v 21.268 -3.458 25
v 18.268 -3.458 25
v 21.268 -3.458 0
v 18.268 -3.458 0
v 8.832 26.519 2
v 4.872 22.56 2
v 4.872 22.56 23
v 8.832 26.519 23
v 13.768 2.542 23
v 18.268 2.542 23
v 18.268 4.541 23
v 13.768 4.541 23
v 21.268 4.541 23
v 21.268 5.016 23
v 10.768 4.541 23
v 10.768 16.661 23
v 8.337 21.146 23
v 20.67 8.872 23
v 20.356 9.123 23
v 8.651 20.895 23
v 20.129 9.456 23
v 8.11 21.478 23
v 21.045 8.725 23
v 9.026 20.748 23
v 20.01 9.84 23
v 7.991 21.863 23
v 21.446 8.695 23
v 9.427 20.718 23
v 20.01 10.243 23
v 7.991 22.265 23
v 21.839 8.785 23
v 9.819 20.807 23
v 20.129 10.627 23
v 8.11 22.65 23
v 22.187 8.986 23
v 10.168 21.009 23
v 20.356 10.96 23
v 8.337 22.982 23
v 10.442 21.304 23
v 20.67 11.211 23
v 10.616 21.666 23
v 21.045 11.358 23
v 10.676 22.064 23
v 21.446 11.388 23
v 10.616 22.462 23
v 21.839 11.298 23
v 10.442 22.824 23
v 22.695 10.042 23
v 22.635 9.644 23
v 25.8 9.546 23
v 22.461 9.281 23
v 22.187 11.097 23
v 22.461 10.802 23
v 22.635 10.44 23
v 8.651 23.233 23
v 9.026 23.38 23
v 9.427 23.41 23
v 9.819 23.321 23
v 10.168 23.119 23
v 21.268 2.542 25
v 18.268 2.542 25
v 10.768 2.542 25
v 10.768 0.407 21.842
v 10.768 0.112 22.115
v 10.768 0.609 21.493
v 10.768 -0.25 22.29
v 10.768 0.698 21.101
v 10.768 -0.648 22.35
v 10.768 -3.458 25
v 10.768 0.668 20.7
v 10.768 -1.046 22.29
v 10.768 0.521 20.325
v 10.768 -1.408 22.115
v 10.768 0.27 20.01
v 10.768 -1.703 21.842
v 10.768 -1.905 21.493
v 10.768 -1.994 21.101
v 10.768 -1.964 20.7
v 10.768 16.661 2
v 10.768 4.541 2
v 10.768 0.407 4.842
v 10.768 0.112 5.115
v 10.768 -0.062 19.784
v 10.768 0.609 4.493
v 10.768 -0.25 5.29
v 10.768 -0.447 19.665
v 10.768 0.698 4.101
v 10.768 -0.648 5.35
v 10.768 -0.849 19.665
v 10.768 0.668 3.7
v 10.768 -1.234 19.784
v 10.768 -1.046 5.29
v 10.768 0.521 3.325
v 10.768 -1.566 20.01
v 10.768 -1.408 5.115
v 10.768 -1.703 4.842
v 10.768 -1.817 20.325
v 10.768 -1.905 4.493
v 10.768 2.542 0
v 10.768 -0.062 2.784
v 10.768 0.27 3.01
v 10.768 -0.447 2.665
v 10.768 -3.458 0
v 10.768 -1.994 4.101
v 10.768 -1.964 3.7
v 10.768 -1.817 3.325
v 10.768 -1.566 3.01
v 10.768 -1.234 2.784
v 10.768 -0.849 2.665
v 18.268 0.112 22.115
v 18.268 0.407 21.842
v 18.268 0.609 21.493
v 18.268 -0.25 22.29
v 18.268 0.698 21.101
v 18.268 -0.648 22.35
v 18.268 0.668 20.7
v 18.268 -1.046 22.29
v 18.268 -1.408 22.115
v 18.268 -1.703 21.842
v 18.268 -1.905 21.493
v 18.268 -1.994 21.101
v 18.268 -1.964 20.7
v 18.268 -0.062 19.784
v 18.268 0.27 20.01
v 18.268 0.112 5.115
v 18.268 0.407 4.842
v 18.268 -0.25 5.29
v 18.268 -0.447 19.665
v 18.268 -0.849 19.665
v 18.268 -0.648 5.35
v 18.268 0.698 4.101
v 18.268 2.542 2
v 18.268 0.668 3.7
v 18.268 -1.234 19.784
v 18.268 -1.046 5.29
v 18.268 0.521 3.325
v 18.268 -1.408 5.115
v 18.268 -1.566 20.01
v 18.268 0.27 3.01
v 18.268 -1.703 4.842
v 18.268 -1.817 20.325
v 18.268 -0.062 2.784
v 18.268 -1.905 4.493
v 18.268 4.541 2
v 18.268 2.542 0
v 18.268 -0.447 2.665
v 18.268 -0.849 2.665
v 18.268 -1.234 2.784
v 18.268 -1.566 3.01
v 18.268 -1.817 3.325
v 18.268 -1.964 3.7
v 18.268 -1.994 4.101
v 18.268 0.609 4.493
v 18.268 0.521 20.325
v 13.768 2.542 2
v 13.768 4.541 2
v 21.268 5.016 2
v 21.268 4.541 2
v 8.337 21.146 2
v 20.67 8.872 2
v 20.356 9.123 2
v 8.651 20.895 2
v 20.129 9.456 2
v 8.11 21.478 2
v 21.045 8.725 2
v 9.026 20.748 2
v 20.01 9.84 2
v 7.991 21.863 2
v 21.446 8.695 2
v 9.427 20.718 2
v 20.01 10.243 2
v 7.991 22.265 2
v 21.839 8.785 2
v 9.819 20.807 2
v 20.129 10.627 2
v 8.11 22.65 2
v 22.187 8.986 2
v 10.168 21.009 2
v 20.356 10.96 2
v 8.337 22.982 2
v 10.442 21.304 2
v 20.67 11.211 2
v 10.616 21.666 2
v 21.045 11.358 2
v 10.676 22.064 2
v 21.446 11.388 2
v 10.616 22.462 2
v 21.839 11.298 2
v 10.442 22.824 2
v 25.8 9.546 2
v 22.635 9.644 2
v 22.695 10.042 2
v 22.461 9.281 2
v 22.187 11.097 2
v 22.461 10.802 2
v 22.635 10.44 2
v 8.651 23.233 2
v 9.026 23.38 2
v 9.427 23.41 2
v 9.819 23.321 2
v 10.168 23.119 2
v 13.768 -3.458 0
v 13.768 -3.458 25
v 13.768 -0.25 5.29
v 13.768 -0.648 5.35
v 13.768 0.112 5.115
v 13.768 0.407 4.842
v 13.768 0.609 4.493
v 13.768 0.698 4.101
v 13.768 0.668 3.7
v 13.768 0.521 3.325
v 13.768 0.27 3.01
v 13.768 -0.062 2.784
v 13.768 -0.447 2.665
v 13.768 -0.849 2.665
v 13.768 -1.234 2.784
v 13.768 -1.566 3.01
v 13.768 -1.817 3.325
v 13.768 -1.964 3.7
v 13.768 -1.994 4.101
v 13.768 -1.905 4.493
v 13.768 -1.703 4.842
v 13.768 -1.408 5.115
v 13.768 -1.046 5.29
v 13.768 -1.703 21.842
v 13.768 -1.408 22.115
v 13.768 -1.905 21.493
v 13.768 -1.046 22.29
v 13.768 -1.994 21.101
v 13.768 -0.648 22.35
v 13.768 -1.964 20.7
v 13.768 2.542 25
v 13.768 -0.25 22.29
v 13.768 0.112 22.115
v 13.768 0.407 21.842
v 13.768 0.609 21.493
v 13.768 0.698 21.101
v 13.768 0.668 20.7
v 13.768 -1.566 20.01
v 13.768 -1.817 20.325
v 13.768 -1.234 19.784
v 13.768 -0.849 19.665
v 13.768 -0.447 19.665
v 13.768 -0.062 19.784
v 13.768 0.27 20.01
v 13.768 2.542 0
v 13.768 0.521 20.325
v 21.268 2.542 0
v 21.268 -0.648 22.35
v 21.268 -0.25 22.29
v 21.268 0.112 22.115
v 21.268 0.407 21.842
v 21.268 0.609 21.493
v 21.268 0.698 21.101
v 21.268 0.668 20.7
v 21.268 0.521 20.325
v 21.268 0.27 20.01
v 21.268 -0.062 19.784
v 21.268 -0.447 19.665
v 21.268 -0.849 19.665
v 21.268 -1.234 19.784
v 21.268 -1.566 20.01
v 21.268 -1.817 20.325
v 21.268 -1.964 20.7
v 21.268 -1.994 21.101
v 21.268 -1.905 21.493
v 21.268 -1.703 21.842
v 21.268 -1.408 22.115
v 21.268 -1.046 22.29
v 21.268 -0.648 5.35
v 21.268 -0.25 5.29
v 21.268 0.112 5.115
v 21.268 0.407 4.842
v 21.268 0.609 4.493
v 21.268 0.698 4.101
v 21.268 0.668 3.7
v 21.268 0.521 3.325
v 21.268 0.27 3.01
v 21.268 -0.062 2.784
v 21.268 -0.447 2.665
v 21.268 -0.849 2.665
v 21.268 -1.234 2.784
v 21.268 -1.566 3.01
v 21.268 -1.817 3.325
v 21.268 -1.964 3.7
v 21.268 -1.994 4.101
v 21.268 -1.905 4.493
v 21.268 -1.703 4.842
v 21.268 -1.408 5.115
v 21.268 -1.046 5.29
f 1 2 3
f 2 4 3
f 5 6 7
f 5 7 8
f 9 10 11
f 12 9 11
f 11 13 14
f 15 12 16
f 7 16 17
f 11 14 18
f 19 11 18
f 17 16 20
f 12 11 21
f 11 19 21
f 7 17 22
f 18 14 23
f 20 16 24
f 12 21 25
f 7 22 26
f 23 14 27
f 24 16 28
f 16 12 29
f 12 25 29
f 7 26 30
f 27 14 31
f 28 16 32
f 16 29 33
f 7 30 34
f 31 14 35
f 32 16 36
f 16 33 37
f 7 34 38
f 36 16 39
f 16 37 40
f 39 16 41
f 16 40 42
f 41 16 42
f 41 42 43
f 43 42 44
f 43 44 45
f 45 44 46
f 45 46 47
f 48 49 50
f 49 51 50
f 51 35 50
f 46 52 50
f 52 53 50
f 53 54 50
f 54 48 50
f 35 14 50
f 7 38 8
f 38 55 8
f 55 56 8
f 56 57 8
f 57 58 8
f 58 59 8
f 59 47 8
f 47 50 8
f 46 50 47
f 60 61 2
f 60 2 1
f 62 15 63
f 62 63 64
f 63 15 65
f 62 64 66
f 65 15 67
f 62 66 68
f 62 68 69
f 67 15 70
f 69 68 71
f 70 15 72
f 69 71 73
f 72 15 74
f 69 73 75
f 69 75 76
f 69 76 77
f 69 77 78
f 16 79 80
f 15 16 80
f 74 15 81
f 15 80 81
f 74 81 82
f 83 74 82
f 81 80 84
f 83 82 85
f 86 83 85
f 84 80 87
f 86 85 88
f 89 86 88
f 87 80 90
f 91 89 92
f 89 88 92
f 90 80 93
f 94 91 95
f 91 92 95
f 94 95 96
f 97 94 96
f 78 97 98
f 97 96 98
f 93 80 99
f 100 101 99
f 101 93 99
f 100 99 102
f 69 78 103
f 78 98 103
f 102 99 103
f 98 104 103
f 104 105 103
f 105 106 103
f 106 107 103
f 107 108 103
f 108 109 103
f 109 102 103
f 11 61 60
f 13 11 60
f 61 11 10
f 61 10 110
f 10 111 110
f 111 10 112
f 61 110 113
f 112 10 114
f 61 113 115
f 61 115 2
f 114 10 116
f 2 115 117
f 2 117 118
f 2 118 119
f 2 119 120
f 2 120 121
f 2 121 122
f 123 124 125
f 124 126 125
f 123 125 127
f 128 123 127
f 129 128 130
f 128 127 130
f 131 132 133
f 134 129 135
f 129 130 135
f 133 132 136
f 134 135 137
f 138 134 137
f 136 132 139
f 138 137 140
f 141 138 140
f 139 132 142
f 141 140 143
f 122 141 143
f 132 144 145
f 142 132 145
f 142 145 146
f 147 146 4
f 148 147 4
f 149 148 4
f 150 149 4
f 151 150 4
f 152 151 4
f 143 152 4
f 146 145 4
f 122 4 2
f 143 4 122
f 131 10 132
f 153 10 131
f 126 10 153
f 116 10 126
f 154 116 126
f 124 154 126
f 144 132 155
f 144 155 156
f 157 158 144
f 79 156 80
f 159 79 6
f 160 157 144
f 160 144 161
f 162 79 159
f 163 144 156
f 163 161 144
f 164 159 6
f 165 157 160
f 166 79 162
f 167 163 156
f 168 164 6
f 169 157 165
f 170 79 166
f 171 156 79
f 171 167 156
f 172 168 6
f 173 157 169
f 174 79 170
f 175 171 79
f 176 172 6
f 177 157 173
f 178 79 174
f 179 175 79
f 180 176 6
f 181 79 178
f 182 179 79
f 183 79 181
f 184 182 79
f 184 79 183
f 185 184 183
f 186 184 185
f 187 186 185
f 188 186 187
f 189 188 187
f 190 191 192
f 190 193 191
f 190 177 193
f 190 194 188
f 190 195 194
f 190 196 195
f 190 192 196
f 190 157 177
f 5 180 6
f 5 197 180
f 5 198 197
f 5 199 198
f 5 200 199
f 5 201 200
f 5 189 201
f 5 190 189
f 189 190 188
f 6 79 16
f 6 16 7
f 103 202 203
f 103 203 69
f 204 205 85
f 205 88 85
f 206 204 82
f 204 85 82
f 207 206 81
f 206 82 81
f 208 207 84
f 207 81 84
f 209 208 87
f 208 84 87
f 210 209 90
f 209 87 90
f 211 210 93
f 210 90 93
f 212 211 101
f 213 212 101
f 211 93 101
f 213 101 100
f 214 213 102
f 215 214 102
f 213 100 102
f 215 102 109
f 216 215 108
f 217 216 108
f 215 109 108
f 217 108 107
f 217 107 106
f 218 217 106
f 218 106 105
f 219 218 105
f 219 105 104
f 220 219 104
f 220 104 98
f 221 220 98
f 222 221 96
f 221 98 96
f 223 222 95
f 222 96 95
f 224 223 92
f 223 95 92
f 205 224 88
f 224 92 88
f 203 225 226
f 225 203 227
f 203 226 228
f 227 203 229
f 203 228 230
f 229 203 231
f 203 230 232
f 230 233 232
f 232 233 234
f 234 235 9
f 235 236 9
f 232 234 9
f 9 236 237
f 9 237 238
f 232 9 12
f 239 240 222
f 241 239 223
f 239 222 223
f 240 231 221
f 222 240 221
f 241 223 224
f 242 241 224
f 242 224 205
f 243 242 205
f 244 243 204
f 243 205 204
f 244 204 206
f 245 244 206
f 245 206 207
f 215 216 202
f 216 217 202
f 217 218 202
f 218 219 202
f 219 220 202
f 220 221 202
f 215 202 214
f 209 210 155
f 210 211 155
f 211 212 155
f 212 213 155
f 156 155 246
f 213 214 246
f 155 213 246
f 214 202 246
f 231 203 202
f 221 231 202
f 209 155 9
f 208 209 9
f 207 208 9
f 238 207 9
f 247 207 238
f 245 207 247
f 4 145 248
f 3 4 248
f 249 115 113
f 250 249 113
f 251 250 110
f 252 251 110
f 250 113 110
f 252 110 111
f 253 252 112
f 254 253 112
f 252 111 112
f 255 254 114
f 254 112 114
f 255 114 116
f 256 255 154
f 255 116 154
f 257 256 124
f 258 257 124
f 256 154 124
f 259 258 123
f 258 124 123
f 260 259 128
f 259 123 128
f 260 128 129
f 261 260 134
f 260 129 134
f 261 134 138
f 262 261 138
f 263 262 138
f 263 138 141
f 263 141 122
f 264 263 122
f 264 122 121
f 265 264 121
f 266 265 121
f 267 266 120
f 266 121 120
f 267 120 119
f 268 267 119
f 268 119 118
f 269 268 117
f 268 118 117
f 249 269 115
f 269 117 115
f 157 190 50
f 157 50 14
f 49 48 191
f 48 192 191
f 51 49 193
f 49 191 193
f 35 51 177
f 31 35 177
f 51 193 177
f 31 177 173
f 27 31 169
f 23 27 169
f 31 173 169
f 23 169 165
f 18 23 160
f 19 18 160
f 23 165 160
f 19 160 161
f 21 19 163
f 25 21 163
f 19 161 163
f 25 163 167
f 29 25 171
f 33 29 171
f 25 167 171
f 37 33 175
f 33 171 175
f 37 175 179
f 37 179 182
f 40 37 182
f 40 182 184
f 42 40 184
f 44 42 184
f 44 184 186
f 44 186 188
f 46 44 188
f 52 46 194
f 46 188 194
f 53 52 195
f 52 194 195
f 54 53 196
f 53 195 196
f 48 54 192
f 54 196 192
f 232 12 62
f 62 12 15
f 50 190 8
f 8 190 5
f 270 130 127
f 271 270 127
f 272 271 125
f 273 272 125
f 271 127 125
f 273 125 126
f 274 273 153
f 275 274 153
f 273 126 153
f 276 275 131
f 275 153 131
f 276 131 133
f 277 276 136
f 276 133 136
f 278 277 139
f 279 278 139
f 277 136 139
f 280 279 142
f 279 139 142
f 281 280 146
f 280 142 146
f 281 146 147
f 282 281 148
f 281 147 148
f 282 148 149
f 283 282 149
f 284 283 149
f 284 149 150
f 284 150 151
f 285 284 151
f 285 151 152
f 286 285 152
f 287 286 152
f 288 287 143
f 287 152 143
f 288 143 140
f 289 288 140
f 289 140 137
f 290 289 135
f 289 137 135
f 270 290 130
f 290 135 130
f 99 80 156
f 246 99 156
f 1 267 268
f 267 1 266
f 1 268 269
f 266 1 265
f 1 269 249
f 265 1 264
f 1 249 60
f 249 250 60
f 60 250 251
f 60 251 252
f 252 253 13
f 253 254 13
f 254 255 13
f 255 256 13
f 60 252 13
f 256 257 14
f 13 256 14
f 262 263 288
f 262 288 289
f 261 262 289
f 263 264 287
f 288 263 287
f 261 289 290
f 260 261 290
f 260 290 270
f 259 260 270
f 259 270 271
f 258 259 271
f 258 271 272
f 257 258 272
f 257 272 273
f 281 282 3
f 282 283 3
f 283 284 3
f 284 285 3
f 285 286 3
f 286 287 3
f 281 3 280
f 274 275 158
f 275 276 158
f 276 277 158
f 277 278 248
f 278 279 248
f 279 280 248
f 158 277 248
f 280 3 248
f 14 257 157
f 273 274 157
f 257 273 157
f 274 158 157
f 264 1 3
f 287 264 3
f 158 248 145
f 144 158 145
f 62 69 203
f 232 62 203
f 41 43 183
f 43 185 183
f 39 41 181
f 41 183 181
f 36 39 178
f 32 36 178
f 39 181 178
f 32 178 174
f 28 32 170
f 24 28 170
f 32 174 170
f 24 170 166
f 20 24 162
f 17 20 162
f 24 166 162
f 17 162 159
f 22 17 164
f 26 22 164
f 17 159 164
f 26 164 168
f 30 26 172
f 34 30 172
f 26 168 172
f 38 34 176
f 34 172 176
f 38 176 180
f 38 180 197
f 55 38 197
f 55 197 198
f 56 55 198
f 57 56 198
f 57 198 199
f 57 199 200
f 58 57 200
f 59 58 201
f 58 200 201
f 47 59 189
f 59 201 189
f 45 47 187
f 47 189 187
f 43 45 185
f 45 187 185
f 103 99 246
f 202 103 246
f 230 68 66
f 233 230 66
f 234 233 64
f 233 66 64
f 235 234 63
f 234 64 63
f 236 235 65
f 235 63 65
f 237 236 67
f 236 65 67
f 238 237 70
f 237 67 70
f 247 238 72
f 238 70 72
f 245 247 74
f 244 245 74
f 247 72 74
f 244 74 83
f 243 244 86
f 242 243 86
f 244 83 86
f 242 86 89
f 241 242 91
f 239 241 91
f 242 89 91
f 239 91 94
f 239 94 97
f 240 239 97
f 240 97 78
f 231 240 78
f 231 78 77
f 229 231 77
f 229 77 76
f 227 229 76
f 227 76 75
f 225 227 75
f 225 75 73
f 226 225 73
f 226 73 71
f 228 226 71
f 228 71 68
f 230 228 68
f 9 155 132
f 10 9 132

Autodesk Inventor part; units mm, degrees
ref_plane "YZ Plane" through (0, 0, 0) normal (1, 0, 0) x (0, 1, 0)
ref_plane "XZ Plane" through (0, 0, 0) normal (0, 1, 0) x (-1, 0, 0)
ref_plane "XY Plane" through (0, 0, 0) normal (0, 0, 1) x (1, 0, 0)
sketch "Sketch1" plane through (0, 0, 0) normal (0, 0, 1) x (1, 0, 0)
  line L0 (13.7683, -3.4584) -> (10.7683, -3.4584)
  line L1 (13.7683, -3.4584) -> (13.7683, 2.5416)
  circle A0 centre (9.3262, 22.064) radius 1.35
  circle A1 centre (21.3453, 10.0416) radius 1.35
  line L2 (10.7683, -3.4584) -> (13.7683, -3.4584)
  line L3 (9.4532, 26.0885) -> (40.2875, 26.0885) construction
  line L4 (13.7683, 2.5416) -> (18.2683, 2.5416)
  line L5 (10.7683, 16.6612) -> (10.7683, -3.4584)
  line L6 (26.507, 8.8387) -> (-1.0663, 36.4198) projected
  arc A2 (26.507, 8.8387) -> (30.7497, 8.8382) centre (28.6286, 10.9598) ccw projected
  line L7 (28.2745, 6.3636) -> (30.7497, 8.8382) projected
  line L8 (28.2745, 6.3636) -> (20.4257, 7.0011) projected
  line L9 (20.4257, 7.0011) -> (-6.8649, 34.2993) projected
  line L10 (-6.8649, 34.2993) -> (-7.5002, 42.1482) projected
  line L11 (-7.5002, 42.1482) -> (10.4629, 60.1062) projected
  line L12 (10.4629, 60.1062) -> (18.3117, 59.4687) projected
  line L13 (18.3117, 59.4687) -> (45.6022, 32.1706) projected
  line L14 (45.6022, 32.1706) -> (46.2375, 24.3216) projected
  line L15 (43.7623, 21.8471) -> (46.2375, 24.3216) projected
  arc A3 (43.7623, 21.8471) -> (43.7628, 26.0897) centre (41.6412, 23.9687) ccw projected
  line L16 (16.1895, 53.6708) -> (43.7628, 26.0897) projected
  arc A4 (16.1895, 53.6708) -> (11.9469, 53.6714) centre (14.0679, 51.5497) ccw projected
  line L17 (-1.0657, 40.6624) -> (11.9469, 53.6714) projected
  arc A5 (-1.0657, 40.6624) -> (-1.0663, 36.4198) centre (1.0553, 38.5408) ccw projected
  line L18 (26.507, 8.8387) -> (-1.0663, 36.4198) projected
  circle A6 centre (18.5232, 55.2968) radius 1.35 projected
  circle A7 centre (-2.693, 34.0865) radius 1.35 projected
  circle A8 centre (9.4722, 55.1566) radius 1.35 projected
  circle A9 centre (30.5424, 43.2743) radius 1.35 projected
  circle A10 centre (42.5615, 31.2518) radius 1.35 projected
  circle A11 centre (-2.5503, 43.1375) radius 1.35 projected
  circle A12 centre (9.3262, 22.064) radius 1.35 projected
  circle A13 centre (21.3453, 10.0416) radius 1.35 projected
  line L19 (4.8715, 22.5596) -> (8.8318, 26.5189)
  line L20 (8.8318, 26.5189) -> (25.8, 9.546)
  line L21 (4.8715, 22.5596) -> (10.7683, 16.6612)
  line L22 (18.2683, -2.9731) -> (18.2683, 2.1519) projected
  line L23 (18.2683, 2.5416) -> (18.2683, -3.4584)
  line L24 (18.2683, -3.4584) -> (21.2683, -3.4584)
  line L25 (21.2683, -3.4584) -> (21.2683, 5.0155)
  line L26 (25.8, 9.546) -> (21.2683, 5.0155)
  point P0 (0, 0)
  dimension "d9" = 2.7
  dimension "d10" = 2.7
  dimension "d12" = 3
  dimension "d28" = 6
  dimension "d35" = 3.5
  dimension "d36" = 24
  dimension "d38" = 3
  dimension "d63" = 4.5
extrude "Extrusion1" add sketch "Sketch1" along normal blind 25 contours L0 L5 L9 L8 L26 L25 L24 L23 L22 L4 L1 | L9 L19 L6 L26 L8
sketch "Sketch3" plane through (10.7683, -3.4584, 0) normal (-1, 0, 0) x (0, 0, 1)
  circle A0 centre (2, 2.8104) radius 1.35 projected
  circle A1 centre (19, 2.8104) radius 1.35 projected
  line L0 (25, 0) -> (25, 20.1196) projected
  line L1 (0, 20.1196) -> (0, 0) projected
  circle A2 centre (4, 2.8104) radius 1.35
  circle A3 centre (21, 2.8104) radius 1.35
  dimension "d48" = 2.7
  dimension "d49" = 2.7
  dimension "d50" = 4
  dimension "d51" = 4
extrude "Extrusion3" cut sketch "Sketch3" against normal through all contours A0 A2 | A0 A2 | A1 A3 | A1 A3 picked at (3.1032, 2.701) picked at (4.6704, 2.7032) picked at (20.1032, 2.9198) picked at (21.6704, 2.9176)
sketch "Sketch5" plane through (10.7683, -3.4584, 0) normal (-1, 0, 0) x (0, 0, 1)
  line L0 (0, 0) -> (25, 0) projected
  line L1 (0, 0) -> (0, 8.4739) projected
  line L2 (0, 6) -> (2, 6)
  line L3 (2, 6) -> (2, 32)
  line L4 (2, 32) -> (0, 32)
  line L5 (0, 32) -> (0, 6)
  line L6 (25, 8.4739) -> (25, 0) projected
  line L7 (25, 6) -> (23, 6)
  line L8 (23, 6) -> (23, 32)
  line L9 (23, 32) -> (25, 32)
  line L10 (25, 32) -> (25, 6)
  point P0 (0, 3.4584)
  dimension "d52" = 2
  dimension "d53" = 26
  dimension "d54" = 6
  dimension "d55" = 2
  dimension "d56" = 26
  dimension "d57" = 6
extrude "Extrusion4" cut sketch "Sketch5" along normal through all both and the other way through all
chamfer "Chamfer1" distance 2 angle 45 4 edges at (12.2683, 2.5416, 23) (19.7683, 2.5416, 23) (19.7683, 2.5416, 2) (12.2683, 2.5416, 2)
properties part number "Knee - Back" material "Aluminum-6061"
